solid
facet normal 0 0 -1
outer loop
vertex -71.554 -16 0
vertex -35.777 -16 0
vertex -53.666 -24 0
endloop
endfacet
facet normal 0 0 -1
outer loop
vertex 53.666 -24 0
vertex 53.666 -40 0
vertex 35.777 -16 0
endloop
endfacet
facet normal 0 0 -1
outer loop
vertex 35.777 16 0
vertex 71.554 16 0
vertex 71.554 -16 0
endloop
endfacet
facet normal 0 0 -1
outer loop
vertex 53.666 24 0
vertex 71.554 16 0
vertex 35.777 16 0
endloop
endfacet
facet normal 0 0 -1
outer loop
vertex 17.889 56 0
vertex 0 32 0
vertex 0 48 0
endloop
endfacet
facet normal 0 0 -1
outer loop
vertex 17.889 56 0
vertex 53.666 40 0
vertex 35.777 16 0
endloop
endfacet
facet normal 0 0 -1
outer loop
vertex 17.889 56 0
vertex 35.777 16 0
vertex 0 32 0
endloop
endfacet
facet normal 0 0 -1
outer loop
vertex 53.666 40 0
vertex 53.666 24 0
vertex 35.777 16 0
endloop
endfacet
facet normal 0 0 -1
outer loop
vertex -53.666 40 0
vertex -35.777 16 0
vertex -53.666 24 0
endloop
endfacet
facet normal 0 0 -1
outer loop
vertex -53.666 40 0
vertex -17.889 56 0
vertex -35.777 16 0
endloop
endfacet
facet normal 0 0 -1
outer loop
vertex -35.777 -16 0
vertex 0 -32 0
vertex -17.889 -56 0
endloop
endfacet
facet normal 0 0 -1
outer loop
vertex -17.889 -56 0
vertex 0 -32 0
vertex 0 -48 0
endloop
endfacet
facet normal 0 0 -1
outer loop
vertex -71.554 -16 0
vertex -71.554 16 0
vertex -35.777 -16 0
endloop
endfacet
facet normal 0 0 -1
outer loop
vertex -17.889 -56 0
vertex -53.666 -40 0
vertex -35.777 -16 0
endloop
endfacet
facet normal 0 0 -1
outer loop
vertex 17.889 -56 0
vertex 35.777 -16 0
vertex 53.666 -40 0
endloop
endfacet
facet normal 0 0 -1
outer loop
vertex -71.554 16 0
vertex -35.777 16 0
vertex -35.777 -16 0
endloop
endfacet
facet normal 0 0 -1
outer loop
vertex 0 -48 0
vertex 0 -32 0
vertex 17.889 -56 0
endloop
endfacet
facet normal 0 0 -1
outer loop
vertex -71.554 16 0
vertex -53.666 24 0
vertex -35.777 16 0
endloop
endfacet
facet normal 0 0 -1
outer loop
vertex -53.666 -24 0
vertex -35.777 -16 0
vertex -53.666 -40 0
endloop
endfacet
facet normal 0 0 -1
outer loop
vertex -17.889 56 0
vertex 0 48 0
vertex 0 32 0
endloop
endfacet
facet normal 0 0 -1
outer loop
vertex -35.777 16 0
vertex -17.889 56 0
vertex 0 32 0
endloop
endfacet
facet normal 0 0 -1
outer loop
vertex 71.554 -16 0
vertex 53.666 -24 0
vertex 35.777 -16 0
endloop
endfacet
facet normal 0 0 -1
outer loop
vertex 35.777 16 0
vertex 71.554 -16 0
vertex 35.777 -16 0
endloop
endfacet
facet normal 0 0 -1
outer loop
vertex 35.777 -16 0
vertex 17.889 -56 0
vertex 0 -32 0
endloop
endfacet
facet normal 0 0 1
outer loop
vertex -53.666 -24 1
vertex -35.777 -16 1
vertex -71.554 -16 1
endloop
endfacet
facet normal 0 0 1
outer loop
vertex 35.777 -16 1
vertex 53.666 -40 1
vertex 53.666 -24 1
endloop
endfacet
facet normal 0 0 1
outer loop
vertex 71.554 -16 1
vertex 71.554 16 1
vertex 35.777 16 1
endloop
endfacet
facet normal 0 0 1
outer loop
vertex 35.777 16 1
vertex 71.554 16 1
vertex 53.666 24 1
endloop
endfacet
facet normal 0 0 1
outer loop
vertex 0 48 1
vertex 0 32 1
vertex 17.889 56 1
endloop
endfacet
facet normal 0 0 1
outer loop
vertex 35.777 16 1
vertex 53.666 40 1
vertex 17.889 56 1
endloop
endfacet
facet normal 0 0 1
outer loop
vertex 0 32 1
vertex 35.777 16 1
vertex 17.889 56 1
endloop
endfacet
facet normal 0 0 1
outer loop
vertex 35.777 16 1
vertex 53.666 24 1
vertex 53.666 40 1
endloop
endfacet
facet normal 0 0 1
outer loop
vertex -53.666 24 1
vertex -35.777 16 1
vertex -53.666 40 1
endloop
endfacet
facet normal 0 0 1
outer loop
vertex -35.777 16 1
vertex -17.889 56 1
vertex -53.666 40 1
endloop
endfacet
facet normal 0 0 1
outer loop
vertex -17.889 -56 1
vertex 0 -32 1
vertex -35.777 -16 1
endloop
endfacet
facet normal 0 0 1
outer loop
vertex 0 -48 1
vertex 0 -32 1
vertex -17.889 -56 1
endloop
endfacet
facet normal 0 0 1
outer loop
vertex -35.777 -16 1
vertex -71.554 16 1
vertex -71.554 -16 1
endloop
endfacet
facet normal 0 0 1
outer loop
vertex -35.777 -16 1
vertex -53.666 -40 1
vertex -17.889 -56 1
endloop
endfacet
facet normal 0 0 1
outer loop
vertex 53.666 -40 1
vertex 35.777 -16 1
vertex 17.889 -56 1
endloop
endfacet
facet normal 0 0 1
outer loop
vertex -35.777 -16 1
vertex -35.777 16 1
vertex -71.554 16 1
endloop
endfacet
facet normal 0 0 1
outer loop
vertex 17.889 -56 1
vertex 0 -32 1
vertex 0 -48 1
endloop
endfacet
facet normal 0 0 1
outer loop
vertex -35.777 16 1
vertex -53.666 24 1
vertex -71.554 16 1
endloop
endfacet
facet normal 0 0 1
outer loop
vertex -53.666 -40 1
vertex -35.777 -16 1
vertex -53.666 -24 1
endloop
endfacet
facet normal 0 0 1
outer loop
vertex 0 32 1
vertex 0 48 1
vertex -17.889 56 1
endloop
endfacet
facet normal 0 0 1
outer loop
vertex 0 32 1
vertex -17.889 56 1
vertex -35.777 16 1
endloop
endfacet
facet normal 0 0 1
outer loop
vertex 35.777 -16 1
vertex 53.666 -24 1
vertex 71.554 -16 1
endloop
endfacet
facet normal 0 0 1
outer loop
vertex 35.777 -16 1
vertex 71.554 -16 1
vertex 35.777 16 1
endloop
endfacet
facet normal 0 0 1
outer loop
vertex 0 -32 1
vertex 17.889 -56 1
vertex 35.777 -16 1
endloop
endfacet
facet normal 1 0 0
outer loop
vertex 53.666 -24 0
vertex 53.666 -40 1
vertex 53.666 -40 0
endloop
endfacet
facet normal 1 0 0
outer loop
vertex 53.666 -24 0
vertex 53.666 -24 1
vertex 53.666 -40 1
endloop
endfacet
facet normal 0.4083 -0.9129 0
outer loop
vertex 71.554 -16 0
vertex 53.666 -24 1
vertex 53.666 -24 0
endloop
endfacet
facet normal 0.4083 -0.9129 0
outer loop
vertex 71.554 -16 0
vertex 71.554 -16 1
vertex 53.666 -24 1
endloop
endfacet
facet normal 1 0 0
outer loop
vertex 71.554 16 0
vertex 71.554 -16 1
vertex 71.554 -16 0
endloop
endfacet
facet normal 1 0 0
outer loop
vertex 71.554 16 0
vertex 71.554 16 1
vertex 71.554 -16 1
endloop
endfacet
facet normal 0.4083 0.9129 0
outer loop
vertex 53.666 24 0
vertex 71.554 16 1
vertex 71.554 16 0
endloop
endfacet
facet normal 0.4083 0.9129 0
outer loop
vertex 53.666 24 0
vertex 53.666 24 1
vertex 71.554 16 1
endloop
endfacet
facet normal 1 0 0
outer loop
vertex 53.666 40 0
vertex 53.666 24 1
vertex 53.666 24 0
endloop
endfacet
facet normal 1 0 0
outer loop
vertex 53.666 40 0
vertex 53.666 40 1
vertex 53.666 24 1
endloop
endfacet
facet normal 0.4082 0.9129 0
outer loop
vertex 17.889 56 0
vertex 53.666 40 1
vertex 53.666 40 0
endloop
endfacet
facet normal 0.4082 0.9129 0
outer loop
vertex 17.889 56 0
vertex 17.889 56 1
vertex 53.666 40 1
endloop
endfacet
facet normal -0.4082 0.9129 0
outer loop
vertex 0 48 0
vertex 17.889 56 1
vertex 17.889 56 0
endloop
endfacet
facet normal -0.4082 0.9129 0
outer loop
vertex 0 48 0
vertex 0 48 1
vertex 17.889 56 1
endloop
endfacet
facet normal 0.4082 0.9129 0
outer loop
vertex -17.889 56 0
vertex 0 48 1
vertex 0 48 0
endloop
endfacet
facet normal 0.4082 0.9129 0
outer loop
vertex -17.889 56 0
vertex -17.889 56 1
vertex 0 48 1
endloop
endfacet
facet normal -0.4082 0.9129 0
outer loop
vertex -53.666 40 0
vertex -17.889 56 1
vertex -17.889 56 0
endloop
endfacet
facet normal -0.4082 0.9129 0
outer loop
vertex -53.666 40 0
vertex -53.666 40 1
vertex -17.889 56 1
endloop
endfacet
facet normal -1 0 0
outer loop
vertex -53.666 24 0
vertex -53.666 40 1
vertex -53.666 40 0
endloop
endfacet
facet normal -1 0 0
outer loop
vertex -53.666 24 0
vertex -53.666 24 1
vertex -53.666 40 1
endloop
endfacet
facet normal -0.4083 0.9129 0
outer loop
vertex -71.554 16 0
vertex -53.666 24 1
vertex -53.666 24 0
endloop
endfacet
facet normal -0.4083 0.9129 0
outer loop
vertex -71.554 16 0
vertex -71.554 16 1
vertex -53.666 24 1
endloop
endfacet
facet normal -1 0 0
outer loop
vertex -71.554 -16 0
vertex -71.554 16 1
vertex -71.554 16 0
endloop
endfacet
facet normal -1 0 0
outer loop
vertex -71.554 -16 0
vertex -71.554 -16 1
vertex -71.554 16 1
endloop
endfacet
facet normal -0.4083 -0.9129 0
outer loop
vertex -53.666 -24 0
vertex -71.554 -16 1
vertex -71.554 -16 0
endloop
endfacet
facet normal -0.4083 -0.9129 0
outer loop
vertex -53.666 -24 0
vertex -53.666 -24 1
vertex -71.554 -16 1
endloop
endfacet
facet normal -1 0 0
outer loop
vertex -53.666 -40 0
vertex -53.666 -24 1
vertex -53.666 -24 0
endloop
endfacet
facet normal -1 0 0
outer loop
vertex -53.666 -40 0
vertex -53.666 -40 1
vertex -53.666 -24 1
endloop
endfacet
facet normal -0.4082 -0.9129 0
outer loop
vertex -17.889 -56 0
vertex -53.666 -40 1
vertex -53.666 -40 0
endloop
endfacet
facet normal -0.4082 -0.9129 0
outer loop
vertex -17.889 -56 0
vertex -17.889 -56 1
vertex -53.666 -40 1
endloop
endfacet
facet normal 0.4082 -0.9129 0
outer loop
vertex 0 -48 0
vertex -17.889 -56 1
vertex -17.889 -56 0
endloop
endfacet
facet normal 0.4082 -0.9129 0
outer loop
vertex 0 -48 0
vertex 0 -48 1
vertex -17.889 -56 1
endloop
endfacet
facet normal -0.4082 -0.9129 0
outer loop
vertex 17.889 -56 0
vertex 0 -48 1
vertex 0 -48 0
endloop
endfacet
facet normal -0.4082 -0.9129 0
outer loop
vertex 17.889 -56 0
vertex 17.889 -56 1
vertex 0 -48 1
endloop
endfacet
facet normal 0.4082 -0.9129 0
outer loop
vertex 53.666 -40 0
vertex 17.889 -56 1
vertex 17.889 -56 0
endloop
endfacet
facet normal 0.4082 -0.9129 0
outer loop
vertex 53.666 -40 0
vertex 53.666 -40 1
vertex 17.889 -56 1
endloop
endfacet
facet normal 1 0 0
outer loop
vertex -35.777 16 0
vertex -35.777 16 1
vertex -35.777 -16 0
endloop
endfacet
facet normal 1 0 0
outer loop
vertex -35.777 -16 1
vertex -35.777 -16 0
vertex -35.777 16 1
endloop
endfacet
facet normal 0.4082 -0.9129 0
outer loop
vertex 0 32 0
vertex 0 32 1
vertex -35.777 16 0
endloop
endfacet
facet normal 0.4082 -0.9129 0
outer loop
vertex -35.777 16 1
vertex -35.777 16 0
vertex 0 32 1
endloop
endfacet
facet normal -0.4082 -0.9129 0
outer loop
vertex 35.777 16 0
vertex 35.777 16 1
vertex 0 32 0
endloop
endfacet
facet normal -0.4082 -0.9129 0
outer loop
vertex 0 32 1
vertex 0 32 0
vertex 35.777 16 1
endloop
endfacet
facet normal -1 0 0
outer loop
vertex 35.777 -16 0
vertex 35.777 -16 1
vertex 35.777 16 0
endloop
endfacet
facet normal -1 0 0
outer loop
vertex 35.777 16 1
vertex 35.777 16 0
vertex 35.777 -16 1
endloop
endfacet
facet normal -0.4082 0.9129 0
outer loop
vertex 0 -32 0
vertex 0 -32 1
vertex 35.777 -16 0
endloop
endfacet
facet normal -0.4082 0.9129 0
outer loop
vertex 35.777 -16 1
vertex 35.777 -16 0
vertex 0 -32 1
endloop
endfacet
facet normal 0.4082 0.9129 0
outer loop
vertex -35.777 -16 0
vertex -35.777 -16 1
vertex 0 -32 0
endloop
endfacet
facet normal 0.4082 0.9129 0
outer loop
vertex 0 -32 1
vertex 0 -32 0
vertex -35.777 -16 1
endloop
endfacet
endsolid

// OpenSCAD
UNIT = 16;
HALF_UNIT = UNIT / 2;
HEIGHT = UNIT * 4;
UNIT_WIDTH = sqrt(UNIT * UNIT + HALF_UNIT * HALF_UNIT);
THICKNESS=1;

POINTS = [
  [-4 * UNIT_WIDTH, -UNIT],
  [-4 * UNIT_WIDTH, UNIT],
  [-3 * UNIT_WIDTH, UNIT + HALF_UNIT],
  [-3 * UNIT_WIDTH, 2 * UNIT + HALF_UNIT],
  [-UNIT_WIDTH, 3 * UNIT + HALF_UNIT],
  [0, 3 * UNIT],
  [UNIT_WIDTH, 3 * UNIT + HALF_UNIT],
  [3 * UNIT_WIDTH, 2 * UNIT + HALF_UNIT],
  [3 * UNIT_WIDTH, UNIT + HALF_UNIT],
  [4 * UNIT_WIDTH, UNIT],
  [4 * UNIT_WIDTH, -UNIT],
  [3 * UNIT_WIDTH, -UNIT - HALF_UNIT],
  [3 * UNIT_WIDTH, -2 * UNIT - HALF_UNIT],
  [UNIT_WIDTH, -3 * UNIT - HALF_UNIT],
  [0, -3 * UNIT],
  [-UNIT_WIDTH, -3 * UNIT - HALF_UNIT],
  [-3 * UNIT_WIDTH, -2 * UNIT - HALF_UNIT],
  [-3 * UNIT_WIDTH, -UNIT - HALF_UNIT],
  [-4 * UNIT_WIDTH, -UNIT],
  [-2 * UNIT_WIDTH, -UNIT],
  [-2 * UNIT_WIDTH, UNIT],
  [0, 2 * UNIT],
  [2 * UNIT_WIDTH, UNIT],
  [2 * UNIT_WIDTH, -UNIT],
  [0, -2 * UNIT],
  [-2 * UNIT_WIDTH, -UNIT],
];

linear_extrude(THICKNESS) polygon(points=POINTS, paths=[[0, 1, 2, 3, 4, 5, 6, 7, 8, 9, 10, 11, 12, 13, 14, 15, 16, 17, 18], [19, 20, 21, 22, 23, 24, 25]]);
